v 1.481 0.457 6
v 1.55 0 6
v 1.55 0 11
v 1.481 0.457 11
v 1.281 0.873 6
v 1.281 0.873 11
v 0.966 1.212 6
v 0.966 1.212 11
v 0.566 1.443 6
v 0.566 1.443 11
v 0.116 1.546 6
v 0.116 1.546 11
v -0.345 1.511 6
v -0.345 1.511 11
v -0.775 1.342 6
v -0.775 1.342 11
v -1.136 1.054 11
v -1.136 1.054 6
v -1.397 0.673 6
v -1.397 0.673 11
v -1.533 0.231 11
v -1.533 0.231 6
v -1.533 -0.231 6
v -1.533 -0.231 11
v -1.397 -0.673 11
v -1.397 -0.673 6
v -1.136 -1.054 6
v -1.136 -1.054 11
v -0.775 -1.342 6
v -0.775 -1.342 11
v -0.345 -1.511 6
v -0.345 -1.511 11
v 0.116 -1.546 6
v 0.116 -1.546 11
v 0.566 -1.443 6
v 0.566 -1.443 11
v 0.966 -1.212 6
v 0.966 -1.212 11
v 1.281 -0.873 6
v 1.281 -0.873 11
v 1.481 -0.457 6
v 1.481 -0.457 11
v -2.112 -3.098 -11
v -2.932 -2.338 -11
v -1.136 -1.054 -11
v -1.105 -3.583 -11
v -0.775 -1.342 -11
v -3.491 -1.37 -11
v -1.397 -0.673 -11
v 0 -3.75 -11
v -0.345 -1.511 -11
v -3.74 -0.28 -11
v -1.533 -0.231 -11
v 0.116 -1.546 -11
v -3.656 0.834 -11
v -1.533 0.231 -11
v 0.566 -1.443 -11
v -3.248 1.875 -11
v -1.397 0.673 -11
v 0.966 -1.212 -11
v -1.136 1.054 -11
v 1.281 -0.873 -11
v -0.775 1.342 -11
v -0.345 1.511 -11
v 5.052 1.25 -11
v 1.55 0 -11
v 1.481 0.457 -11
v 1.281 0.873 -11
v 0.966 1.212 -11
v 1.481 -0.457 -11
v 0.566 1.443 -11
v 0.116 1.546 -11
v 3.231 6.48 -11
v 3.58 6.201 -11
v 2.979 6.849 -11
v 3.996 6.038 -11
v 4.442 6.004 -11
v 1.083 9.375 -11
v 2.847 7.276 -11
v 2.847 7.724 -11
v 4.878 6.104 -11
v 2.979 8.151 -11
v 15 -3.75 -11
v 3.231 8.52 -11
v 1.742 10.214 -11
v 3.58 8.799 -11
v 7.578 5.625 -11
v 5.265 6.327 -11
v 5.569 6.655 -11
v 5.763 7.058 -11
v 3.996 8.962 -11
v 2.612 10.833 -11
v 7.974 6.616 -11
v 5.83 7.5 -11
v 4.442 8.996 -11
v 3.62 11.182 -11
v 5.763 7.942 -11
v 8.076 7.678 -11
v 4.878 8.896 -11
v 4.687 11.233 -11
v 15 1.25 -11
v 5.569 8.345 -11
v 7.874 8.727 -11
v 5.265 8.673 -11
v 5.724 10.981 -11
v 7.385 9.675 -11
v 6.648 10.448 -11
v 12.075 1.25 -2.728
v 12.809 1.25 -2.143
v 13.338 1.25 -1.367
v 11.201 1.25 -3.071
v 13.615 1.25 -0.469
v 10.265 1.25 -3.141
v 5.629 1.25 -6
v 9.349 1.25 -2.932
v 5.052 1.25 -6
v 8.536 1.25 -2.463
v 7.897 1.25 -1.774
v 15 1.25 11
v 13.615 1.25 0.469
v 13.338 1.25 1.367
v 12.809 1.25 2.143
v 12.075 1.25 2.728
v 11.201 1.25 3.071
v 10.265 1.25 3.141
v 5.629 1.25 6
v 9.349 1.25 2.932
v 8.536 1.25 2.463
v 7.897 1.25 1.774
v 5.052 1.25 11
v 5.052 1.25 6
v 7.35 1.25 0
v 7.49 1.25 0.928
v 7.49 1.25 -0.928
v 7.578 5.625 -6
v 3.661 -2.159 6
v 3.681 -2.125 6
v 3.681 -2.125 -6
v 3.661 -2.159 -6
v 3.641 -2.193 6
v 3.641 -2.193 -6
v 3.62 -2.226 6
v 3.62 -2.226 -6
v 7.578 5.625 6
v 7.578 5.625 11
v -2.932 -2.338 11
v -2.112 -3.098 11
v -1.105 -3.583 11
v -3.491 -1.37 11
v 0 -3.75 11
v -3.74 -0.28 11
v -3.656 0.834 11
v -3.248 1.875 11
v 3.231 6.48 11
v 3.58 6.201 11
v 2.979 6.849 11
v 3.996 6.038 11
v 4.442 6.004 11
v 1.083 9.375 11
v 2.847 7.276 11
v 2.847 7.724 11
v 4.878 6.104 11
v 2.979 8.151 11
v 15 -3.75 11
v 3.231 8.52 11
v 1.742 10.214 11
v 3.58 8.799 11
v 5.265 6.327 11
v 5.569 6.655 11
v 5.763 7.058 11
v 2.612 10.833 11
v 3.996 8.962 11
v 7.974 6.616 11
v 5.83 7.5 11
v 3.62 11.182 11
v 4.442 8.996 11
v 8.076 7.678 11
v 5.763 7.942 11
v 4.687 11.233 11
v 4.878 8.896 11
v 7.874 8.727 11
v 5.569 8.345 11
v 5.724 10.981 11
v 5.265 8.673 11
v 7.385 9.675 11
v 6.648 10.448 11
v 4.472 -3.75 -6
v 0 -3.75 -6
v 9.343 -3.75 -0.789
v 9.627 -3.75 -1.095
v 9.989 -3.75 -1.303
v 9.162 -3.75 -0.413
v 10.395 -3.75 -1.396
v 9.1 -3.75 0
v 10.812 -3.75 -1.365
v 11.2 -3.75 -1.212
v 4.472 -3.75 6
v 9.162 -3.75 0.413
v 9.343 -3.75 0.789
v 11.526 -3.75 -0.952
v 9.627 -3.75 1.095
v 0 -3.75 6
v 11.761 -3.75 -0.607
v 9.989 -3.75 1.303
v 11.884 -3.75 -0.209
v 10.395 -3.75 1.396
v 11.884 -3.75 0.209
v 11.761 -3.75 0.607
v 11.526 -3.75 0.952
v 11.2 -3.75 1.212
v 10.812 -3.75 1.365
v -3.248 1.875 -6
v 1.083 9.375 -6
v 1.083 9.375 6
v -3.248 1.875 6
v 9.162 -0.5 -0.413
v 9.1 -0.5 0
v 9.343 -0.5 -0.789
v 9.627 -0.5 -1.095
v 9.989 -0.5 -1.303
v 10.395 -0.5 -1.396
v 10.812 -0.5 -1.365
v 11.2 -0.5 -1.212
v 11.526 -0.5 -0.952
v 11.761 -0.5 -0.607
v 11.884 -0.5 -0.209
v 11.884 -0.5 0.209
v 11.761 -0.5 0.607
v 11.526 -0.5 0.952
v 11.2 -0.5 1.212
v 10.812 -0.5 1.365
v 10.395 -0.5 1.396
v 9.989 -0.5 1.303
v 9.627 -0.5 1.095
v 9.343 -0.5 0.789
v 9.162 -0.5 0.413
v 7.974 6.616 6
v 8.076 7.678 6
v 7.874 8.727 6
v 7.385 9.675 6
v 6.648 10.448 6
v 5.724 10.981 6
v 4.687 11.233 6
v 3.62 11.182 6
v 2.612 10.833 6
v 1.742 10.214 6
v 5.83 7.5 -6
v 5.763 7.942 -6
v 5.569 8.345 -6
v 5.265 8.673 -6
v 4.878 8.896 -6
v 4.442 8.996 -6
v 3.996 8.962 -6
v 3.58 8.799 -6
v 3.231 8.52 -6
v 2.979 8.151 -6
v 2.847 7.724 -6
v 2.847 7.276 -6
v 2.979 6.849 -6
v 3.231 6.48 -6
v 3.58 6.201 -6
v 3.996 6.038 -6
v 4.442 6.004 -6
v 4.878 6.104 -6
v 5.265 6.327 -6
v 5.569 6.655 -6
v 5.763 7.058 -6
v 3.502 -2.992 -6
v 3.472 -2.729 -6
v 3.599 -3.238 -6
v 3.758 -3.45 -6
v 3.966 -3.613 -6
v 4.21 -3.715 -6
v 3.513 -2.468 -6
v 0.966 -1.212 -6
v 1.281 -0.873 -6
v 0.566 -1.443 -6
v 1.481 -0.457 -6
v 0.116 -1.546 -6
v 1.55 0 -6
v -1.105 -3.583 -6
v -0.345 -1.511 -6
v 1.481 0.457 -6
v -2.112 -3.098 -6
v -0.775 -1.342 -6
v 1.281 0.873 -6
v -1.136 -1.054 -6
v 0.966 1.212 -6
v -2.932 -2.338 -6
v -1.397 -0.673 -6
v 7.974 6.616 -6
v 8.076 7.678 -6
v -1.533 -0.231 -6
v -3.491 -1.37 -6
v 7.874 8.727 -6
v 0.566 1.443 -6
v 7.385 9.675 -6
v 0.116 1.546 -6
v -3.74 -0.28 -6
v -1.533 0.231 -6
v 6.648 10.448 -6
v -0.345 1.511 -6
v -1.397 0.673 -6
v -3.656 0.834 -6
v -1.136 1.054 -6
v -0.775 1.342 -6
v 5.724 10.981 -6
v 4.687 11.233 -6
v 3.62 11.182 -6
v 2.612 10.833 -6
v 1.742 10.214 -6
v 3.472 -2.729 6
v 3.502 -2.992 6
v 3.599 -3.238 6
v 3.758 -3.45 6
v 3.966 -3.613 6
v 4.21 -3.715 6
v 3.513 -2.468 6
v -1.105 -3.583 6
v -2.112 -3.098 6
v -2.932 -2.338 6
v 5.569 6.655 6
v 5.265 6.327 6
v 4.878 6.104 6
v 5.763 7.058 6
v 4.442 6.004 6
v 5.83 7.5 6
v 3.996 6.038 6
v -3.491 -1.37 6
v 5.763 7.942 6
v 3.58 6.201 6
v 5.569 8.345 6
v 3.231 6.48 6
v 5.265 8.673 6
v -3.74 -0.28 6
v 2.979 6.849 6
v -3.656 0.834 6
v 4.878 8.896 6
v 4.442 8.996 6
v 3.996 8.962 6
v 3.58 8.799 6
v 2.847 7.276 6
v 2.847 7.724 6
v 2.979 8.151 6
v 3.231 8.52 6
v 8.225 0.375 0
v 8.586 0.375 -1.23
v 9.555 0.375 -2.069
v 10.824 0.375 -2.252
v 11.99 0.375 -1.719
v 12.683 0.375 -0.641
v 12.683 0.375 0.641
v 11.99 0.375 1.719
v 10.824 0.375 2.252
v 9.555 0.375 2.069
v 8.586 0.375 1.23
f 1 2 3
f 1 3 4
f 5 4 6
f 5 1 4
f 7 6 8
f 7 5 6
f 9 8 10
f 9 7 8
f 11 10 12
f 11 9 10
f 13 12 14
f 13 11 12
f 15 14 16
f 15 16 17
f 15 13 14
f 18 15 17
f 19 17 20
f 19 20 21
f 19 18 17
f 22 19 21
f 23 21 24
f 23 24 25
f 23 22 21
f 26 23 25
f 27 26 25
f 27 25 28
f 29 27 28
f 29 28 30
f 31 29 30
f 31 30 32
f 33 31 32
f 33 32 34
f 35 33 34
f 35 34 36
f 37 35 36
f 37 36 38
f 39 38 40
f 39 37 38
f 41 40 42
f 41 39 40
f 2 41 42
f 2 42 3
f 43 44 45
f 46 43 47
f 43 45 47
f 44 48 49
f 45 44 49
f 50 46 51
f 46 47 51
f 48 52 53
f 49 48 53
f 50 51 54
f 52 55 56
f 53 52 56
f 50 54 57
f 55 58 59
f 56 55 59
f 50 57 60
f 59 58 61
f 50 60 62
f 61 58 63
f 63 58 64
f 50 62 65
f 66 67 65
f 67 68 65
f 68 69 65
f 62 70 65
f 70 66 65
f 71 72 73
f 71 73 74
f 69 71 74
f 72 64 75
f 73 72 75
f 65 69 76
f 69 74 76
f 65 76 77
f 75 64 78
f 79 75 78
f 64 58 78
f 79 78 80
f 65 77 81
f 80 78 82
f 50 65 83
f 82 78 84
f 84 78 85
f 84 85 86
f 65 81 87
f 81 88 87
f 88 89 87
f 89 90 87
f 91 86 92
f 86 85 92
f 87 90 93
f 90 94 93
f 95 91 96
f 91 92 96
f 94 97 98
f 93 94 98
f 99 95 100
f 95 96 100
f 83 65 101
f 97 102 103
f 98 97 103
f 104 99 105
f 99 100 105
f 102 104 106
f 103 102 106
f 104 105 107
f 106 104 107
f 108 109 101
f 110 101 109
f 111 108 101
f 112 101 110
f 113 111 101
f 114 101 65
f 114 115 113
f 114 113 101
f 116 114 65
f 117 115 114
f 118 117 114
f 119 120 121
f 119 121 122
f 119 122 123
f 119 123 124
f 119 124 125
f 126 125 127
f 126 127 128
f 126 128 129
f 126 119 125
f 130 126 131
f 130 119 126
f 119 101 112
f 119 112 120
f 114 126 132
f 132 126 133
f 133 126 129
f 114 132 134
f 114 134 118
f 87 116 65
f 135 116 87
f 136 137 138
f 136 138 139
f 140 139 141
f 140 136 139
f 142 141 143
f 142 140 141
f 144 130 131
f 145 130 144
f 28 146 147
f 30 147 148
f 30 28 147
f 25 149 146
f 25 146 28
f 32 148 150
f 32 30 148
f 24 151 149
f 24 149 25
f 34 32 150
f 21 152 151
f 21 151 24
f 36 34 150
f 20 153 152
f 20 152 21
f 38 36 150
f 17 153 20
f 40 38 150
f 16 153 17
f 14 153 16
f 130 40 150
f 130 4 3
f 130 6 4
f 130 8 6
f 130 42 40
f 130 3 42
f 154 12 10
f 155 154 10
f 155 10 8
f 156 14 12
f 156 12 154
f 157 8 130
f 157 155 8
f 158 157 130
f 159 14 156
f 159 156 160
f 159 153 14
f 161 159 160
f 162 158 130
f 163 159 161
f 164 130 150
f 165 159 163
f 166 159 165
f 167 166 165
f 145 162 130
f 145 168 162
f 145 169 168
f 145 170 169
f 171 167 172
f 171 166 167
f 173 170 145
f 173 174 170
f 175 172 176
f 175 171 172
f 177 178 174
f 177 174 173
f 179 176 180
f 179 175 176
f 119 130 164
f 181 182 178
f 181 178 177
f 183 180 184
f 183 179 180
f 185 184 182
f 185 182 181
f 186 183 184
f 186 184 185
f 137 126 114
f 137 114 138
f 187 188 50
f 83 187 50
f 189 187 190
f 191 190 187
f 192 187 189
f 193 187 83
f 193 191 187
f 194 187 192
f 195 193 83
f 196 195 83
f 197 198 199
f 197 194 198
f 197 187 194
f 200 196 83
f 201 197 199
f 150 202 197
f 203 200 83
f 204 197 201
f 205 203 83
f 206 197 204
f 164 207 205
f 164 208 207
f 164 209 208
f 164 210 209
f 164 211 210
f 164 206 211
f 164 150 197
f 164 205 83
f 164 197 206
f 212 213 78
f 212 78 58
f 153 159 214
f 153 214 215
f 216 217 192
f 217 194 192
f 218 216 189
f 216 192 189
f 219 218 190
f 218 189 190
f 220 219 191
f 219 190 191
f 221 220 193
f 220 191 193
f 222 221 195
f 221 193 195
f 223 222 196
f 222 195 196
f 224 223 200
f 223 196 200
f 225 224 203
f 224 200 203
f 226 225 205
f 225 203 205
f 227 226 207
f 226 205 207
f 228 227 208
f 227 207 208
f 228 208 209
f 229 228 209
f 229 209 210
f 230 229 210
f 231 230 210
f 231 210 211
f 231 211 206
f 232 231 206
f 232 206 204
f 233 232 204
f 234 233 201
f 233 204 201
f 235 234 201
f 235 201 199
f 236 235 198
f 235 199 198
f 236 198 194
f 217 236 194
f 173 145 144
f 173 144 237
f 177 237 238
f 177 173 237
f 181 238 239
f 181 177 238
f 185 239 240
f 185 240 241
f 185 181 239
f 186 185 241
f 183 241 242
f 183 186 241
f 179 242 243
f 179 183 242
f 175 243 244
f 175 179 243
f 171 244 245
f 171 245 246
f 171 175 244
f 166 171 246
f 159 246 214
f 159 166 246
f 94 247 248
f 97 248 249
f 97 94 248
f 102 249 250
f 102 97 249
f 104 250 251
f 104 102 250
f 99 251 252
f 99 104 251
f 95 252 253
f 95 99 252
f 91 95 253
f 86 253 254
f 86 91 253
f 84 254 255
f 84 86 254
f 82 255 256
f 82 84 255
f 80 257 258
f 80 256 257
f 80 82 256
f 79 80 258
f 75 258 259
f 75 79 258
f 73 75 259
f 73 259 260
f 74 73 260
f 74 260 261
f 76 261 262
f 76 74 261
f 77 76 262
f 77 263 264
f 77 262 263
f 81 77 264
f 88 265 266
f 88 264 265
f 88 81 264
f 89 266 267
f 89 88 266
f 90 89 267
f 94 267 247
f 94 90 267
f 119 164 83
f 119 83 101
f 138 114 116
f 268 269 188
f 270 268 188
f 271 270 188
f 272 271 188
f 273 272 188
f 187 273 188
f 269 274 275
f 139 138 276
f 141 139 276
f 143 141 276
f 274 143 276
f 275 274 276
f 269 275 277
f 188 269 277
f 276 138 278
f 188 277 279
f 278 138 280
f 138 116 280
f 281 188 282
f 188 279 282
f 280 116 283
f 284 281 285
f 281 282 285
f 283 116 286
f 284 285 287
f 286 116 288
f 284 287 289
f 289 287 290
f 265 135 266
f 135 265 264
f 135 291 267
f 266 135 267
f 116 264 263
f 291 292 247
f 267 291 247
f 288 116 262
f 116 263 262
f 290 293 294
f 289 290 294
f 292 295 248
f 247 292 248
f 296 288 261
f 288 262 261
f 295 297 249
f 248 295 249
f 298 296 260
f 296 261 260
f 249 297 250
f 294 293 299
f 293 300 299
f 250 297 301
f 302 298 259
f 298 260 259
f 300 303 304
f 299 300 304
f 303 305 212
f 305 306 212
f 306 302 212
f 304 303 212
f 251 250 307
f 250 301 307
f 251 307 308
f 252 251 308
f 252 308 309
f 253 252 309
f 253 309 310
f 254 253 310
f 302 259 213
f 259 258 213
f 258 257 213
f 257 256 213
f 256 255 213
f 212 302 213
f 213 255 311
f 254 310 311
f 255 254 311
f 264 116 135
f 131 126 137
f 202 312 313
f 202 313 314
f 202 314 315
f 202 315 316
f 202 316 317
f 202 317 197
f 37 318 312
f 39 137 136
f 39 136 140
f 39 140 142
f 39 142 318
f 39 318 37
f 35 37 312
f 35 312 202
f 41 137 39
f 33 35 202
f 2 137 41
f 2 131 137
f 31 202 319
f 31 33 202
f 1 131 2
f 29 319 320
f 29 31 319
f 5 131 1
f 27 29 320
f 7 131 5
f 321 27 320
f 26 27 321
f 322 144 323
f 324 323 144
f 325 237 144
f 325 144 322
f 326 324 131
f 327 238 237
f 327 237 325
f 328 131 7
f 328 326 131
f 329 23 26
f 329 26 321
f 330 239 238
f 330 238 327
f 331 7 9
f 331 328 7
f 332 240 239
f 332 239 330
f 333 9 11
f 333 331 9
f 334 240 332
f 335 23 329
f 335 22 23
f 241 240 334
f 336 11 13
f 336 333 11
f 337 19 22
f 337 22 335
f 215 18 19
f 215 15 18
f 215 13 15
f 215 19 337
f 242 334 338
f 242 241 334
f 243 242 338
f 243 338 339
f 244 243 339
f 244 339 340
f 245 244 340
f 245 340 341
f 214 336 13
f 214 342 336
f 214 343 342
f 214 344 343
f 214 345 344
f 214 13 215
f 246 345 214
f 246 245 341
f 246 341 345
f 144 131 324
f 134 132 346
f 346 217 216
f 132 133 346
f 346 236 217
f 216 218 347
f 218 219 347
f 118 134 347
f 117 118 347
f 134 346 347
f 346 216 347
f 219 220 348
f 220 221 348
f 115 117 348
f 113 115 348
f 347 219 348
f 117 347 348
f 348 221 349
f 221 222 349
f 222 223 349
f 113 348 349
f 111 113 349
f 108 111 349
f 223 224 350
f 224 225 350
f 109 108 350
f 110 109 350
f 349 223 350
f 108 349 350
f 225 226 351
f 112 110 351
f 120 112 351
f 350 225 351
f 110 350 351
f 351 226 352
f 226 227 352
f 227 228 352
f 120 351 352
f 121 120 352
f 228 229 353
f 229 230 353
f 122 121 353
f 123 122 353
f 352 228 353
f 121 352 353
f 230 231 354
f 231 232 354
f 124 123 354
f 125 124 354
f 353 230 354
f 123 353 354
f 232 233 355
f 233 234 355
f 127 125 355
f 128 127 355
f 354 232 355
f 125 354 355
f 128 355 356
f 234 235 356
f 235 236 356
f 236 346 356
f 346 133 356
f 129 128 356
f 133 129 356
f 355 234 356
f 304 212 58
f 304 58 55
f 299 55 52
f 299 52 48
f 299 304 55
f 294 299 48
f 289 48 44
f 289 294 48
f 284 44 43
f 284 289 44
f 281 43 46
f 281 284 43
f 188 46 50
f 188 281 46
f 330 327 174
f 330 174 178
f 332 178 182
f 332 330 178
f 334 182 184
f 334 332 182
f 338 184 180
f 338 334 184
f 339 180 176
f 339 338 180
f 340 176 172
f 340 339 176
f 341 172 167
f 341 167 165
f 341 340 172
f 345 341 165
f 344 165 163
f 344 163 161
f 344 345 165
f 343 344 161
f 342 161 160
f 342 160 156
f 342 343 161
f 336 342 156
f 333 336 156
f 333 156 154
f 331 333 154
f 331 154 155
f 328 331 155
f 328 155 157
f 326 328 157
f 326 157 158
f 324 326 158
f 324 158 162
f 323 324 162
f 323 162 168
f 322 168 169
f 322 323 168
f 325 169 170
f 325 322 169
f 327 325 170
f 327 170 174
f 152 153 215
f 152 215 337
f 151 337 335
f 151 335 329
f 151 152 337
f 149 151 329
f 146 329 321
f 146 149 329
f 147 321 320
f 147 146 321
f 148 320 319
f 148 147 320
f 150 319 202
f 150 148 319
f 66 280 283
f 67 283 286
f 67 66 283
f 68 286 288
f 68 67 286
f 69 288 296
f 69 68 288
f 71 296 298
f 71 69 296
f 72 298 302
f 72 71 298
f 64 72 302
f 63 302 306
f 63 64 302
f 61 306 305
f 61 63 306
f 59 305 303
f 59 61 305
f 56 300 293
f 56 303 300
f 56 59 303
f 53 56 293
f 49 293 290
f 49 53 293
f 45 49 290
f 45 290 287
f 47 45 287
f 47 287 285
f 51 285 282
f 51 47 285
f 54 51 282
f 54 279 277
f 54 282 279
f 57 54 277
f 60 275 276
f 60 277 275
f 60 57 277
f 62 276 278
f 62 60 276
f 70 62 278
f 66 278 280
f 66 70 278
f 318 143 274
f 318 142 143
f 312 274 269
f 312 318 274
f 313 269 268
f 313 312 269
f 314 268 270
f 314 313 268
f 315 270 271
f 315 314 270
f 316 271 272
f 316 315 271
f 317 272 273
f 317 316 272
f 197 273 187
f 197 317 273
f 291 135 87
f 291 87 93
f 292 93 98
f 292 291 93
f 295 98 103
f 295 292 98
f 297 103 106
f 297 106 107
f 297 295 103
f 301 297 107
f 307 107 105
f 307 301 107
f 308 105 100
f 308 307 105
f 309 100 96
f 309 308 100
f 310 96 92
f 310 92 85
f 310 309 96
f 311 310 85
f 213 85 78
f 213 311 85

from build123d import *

# Parameters (mm, degrees)
SKETCH1_R                                       = 1.55
SKETCH1_R_2                                     = 1.5
BOSS_EXTRUDE1_DEPTH                             = 11
CUT_EXTRUDE1_DEPTH                              = 6
CSK_FOR_M3_FLAT_HEAD_MACHINE_SCREW1_D           = 2.8
CSK_FOR_M3_FLAT_HEAD_MACHINE_SCREW1_DEPTH       = 10
CSK_FOR_M3_FLAT_HEAD_MACHINE_SCREW1_CSINK_D     = 6.3
CSK_FOR_M3_FLAT_HEAD_MACHINE_SCREW1_CSINK_ANGLE = 90
CSK_FOR_M3_FLAT_HEAD_MACHINE_SCREW1_TIP         = 0.841204867
FILLET1_R                                       = 1


with BuildPart() as part:
    # Sketch1 → Boss-Extrude1 (new body, symmetric)
    with BuildSketch(Plane.XY):
        with BuildLine():
            Line((1.082531755, 9.375), (-3.247595264, 1.875))
            ThreePointArc((-3.247595264, 1.875), (-3.247595264, -1.875), (0, -3.75))
            Line((0, -3.75), (15, -3.75))
            Line((15, -3.75), (15, 1.25))
            Line((15, 1.25), (5.051814855, 1.25))
            Line((5.051814855, 1.25), (7.577722283, 5.625))
            ThreePointArc((7.577722283, 5.625), (6.205127019, 10.747595264), (1.082531755, 9.375))
        make_face()
        Circle(SKETCH1_R, mode=Mode.SUBTRACT)
        with Locations((4.330127019, 7.5)):
            Circle(SKETCH1_R_2, mode=Mode.SUBTRACT)
    extrude(amount=BOSS_EXTRUDE1_DEPTH, both=True)

    # Sketch5 → Cut-Extrude1 (cut, symmetric)
    with BuildSketch(Plane.XY):
        with BuildLine():
            Line((-3.680607966, 2.125), (5.998626937, 18.88992663))
            Line((5.998626937, 18.88992663), (13.359842869, 14.63992663))
            Line((13.359842869, 14.63992663), (3.680607966, -2.125))
            ThreePointArc((3.680607966, -2.125), (-2.125, -3.680607966), (-3.680607966, 2.125))
        make_face()
    extrude(amount=CUT_EXTRUDE1_DEPTH, both=True, mode=Mode.SUBTRACT)

    # CSK for M3 Flat Head Machine Screw1
    with Locations(Plane(origin=(0, 1.25, 0), x_dir=(1, 0, 0), z_dir=(0, 1, 0))):
        with Locations((10.5, 0)):
            CounterSinkHole(CSK_FOR_M3_FLAT_HEAD_MACHINE_SCREW1_D / 2, CSK_FOR_M3_FLAT_HEAD_MACHINE_SCREW1_CSINK_D / 2, depth=CSK_FOR_M3_FLAT_HEAD_MACHINE_SCREW1_DEPTH, counter_sink_angle=CSK_FOR_M3_FLAT_HEAD_MACHINE_SCREW1_CSINK_ANGLE)
            with Locations((0, 0, -(CSK_FOR_M3_FLAT_HEAD_MACHINE_SCREW1_DEPTH + CSK_FOR_M3_FLAT_HEAD_MACHINE_SCREW1_TIP / 2))):  # 118° drill point
                Cone(0, CSK_FOR_M3_FLAT_HEAD_MACHINE_SCREW1_D / 2, CSK_FOR_M3_FLAT_HEAD_MACHINE_SCREW1_TIP, mode=Mode.SUBTRACT)

    # Fillet1
    fillet1_edges = [part.edges().sort_by_distance(p)[0] for p in [
        (2, -3.75, 0),
    ]]
    fillet(fillet1_edges, radius=FILLET1_R)


solid = part.part
